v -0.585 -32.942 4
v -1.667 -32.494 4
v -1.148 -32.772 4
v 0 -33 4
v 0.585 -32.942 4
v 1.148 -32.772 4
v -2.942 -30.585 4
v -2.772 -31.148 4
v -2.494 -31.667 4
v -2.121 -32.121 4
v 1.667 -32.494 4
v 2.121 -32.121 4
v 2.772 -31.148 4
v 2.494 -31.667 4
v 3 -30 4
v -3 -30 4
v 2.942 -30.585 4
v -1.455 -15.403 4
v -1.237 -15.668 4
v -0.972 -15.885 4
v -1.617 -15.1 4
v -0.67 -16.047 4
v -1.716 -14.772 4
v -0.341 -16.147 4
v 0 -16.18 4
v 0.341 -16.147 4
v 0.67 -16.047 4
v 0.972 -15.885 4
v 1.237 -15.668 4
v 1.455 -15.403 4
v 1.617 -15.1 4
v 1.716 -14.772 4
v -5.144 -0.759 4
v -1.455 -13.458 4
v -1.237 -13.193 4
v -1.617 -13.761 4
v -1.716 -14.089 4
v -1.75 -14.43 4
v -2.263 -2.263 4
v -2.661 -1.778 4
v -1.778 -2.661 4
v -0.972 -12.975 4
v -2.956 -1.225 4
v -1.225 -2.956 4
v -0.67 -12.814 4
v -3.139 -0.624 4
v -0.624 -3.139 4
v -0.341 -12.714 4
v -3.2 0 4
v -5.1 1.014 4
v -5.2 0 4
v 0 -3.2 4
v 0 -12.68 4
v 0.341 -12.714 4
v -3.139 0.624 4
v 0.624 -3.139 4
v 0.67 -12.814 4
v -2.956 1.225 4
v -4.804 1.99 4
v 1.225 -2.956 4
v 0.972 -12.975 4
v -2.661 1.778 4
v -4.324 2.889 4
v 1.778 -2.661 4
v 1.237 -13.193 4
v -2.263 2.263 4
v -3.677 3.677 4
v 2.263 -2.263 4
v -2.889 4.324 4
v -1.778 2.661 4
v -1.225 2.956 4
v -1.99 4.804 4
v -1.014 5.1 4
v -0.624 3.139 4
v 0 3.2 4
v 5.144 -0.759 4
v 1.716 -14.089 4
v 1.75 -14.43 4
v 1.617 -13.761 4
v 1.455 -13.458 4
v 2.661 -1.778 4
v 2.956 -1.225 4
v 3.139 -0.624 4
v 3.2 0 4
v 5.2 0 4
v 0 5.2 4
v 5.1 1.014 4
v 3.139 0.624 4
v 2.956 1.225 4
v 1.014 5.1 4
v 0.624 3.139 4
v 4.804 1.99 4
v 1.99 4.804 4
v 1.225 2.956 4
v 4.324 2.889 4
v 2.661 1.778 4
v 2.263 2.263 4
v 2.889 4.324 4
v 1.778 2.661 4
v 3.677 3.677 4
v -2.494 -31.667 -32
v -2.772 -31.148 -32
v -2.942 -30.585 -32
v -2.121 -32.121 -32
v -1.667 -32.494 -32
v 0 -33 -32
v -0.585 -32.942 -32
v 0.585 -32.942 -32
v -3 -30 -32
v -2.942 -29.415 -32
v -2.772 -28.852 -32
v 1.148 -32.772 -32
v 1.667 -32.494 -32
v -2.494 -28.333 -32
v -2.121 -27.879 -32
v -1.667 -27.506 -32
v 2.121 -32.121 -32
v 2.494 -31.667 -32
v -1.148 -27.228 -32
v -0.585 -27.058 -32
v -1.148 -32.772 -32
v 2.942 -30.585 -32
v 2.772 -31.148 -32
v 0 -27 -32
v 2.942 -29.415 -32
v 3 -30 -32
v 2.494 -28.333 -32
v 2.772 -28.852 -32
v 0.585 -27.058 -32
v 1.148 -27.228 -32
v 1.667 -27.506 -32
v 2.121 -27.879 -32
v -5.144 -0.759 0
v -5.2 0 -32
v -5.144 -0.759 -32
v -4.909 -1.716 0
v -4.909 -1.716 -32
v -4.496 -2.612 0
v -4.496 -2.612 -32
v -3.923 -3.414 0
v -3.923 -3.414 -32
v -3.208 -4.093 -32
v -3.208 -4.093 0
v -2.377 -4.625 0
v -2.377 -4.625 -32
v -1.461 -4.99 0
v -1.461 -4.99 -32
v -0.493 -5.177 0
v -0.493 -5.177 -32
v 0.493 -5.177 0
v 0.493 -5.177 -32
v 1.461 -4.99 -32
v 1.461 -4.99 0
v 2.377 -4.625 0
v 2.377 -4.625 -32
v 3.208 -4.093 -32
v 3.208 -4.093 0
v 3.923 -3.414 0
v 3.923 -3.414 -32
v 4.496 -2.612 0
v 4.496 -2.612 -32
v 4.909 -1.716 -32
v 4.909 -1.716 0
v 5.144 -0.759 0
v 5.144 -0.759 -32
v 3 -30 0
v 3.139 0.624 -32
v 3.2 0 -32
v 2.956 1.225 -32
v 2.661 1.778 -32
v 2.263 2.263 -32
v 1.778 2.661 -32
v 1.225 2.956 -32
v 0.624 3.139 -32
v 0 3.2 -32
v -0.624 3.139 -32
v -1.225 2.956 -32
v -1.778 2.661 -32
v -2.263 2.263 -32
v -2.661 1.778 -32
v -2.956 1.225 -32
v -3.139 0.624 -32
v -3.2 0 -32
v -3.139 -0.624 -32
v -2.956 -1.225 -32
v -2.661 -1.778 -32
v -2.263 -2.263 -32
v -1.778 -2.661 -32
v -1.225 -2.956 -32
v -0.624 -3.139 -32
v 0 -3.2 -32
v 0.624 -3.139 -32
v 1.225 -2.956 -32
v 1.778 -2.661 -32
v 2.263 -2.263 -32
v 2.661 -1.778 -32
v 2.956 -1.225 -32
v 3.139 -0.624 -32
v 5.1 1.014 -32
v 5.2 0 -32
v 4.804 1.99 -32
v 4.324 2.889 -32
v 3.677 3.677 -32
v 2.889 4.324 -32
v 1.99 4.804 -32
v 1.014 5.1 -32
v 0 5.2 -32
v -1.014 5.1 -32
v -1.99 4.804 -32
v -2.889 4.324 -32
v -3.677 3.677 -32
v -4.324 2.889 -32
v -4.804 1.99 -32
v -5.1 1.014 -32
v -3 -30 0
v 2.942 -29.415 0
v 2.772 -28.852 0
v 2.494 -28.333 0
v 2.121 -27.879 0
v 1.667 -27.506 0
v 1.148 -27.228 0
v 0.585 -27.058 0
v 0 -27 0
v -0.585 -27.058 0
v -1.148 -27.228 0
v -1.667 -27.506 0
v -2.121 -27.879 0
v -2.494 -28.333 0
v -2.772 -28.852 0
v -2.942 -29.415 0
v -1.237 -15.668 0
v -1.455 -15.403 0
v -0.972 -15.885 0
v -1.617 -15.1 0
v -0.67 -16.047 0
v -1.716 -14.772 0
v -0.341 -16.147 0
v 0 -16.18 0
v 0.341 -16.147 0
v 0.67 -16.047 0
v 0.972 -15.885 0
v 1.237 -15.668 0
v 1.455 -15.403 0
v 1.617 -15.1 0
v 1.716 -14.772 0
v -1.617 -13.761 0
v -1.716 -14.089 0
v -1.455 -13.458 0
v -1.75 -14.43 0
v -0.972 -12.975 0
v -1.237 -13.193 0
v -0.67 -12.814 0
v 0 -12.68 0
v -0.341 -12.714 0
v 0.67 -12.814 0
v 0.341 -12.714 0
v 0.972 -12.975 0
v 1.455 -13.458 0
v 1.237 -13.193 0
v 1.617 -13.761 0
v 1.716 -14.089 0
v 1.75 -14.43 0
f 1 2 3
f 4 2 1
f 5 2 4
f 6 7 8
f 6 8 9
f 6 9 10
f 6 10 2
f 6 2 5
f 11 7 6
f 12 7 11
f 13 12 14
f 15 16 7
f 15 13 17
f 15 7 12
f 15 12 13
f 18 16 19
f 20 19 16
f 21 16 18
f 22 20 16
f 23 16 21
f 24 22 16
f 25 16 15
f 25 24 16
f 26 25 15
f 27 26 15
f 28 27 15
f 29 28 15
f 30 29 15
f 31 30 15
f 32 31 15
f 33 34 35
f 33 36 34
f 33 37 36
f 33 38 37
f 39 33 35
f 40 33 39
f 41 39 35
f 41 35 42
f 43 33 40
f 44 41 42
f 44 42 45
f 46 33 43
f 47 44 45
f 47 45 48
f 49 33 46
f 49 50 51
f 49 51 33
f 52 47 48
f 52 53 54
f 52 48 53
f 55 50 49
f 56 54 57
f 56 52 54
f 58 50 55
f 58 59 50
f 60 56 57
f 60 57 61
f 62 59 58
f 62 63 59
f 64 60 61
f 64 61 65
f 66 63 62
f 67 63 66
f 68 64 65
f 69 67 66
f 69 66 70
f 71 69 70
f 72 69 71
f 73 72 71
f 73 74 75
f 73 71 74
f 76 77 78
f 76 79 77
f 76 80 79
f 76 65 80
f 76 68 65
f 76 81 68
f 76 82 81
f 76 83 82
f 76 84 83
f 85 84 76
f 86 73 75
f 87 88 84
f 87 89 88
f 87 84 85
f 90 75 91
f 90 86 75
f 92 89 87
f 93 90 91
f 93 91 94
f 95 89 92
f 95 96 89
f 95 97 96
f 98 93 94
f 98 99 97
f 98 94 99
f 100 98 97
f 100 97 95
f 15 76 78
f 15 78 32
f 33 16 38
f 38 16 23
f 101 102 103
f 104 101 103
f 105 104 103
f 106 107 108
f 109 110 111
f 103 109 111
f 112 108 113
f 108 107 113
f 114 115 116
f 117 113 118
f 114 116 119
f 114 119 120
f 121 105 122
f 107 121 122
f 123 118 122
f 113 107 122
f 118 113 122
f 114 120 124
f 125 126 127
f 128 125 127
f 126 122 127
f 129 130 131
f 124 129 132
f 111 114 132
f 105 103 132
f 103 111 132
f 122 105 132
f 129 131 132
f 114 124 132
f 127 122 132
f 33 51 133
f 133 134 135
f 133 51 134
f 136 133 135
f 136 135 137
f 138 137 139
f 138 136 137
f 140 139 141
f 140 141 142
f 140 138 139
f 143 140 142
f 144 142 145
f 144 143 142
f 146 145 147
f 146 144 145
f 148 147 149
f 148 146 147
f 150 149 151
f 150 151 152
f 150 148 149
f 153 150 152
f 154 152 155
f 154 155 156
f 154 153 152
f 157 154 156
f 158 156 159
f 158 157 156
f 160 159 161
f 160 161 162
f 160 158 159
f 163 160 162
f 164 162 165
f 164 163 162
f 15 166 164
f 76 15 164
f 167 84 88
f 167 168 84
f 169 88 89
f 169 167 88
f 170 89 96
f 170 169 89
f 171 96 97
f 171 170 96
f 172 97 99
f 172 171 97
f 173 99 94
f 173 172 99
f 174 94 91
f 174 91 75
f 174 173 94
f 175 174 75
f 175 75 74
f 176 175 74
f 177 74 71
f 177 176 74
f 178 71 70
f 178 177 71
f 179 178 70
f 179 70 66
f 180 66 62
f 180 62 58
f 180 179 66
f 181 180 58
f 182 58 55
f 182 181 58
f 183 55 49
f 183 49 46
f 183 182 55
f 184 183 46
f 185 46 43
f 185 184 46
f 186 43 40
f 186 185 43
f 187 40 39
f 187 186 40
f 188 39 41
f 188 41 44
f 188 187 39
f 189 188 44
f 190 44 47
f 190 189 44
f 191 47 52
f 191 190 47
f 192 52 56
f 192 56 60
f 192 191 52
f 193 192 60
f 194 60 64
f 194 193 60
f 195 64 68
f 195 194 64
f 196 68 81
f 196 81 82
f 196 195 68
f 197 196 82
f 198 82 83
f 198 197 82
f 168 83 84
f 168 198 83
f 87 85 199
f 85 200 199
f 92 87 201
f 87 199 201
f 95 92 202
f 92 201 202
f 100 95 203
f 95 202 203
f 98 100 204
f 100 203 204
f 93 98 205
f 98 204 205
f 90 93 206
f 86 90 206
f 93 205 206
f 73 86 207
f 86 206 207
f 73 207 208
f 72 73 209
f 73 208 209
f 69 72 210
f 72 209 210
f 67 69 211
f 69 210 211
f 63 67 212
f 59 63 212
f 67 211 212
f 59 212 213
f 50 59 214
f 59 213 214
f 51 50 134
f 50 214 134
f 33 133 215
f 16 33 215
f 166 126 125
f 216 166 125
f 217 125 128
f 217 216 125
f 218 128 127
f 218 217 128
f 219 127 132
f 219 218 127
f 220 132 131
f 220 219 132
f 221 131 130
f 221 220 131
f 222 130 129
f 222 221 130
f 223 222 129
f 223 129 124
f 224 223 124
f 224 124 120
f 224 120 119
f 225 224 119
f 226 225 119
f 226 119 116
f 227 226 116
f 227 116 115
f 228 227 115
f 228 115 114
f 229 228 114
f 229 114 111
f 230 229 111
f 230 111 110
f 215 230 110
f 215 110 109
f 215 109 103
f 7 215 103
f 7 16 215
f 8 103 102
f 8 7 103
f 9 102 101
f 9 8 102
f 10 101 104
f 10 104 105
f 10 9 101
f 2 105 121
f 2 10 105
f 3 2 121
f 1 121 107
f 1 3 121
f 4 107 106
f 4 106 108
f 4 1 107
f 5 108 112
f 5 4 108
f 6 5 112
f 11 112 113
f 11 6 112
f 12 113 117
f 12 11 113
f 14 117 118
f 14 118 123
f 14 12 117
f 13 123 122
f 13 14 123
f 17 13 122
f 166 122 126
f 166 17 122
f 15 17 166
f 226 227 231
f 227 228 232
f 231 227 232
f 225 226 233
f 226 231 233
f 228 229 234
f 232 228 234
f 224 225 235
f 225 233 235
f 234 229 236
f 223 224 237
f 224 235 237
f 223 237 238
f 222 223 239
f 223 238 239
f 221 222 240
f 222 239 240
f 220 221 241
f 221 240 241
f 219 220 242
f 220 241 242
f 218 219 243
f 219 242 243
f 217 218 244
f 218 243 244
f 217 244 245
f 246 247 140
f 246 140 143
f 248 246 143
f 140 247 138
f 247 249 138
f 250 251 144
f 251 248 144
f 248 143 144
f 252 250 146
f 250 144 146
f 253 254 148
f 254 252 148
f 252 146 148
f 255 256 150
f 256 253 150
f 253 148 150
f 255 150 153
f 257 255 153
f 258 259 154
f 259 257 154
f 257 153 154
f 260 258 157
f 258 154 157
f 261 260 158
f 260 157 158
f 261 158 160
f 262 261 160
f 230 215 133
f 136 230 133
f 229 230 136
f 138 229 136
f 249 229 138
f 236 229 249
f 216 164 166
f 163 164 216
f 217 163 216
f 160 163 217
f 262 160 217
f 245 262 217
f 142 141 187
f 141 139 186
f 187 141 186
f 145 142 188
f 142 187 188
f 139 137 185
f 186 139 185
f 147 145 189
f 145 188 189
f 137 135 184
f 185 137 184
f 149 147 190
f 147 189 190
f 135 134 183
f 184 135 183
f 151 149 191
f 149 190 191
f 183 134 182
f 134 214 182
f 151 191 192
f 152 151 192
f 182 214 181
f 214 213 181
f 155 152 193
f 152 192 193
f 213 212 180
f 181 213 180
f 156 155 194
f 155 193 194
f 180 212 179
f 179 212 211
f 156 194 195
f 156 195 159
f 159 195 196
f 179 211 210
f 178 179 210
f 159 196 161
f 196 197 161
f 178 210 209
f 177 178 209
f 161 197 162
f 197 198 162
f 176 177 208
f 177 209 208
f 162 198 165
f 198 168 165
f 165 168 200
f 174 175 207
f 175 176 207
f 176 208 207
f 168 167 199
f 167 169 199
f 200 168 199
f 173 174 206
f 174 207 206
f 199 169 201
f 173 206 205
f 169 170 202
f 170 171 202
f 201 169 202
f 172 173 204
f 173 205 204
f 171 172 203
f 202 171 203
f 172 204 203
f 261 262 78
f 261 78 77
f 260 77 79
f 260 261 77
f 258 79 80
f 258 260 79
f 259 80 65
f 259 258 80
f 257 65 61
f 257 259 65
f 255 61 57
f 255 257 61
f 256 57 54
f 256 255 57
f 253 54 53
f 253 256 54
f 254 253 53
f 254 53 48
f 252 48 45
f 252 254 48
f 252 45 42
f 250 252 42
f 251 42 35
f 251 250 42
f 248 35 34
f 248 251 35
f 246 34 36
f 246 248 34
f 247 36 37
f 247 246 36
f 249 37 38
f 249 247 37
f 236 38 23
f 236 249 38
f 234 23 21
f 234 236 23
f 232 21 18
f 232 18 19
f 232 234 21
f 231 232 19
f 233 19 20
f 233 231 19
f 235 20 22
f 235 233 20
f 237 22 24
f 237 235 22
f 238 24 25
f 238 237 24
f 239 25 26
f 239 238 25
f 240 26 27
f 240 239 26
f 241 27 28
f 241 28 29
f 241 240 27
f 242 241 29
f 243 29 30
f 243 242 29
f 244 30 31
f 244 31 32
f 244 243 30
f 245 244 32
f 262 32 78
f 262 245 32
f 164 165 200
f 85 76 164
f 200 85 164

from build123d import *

# Parameters (mm, degrees)
SKETCH1_R           = 1.75
SKETCH1_R_2         = 3.2
BOSS_EXTRUDE1_DEPTH = 4
BOSS_EXTRUDE2_START = -32
SKETCH1_4_R         = 3
SKETCH1_4_R_2       = 3.2
BOSS_EXTRUDE2_DEPTH = 32


with BuildPart() as part:
    # Sketch1 → Boss-Extrude1 (new body)
    with BuildSketch(Plane.XY):
        with BuildLine():
            ThreePointArc((-3, -30), (0, -33), (3, -30))
            Line((3, -30), (5.2, 0))
            ThreePointArc((5.2, 0), (0, 5.2), (-5.2, 0))
            Line((-5.2, 0), (-3, -30))
        make_face()
        with Locations((0, -14.430389534)):
            Circle(SKETCH1_R, mode=Mode.SUBTRACT)
        Circle(SKETCH1_R_2, mode=Mode.SUBTRACT)
    extrude(amount=BOSS_EXTRUDE1_DEPTH)

    # Sketch1<4> → Boss-Extrude2 (add)
    # profile 1 of 2: a face of its own
    with BuildSketch(Plane.XY.offset(BOSS_EXTRUDE2_START)):
        with Locations((0, -30)):
            Circle(SKETCH1_4_R)
    # profile 2 of 2: a face of its own
    with BuildSketch(Plane.XY.offset(BOSS_EXTRUDE2_START)):
        with BuildLine():
            Line((-5.2, 0), (-5.144370275, -0.758587154))
            ThreePointArc((-5.144370275, -0.758587154), (0, -5.2), (5.144370275, -0.758587154))
            Line((5.144370275, -0.758587154), (5.2, 0))
            ThreePointArc((5.2, 0), (0, 5.2), (-5.2, 0))
        make_face()
        Circle(SKETCH1_4_R_2, mode=Mode.SUBTRACT)
    extrude(amount=BOSS_EXTRUDE2_DEPTH)


solid = part.part
